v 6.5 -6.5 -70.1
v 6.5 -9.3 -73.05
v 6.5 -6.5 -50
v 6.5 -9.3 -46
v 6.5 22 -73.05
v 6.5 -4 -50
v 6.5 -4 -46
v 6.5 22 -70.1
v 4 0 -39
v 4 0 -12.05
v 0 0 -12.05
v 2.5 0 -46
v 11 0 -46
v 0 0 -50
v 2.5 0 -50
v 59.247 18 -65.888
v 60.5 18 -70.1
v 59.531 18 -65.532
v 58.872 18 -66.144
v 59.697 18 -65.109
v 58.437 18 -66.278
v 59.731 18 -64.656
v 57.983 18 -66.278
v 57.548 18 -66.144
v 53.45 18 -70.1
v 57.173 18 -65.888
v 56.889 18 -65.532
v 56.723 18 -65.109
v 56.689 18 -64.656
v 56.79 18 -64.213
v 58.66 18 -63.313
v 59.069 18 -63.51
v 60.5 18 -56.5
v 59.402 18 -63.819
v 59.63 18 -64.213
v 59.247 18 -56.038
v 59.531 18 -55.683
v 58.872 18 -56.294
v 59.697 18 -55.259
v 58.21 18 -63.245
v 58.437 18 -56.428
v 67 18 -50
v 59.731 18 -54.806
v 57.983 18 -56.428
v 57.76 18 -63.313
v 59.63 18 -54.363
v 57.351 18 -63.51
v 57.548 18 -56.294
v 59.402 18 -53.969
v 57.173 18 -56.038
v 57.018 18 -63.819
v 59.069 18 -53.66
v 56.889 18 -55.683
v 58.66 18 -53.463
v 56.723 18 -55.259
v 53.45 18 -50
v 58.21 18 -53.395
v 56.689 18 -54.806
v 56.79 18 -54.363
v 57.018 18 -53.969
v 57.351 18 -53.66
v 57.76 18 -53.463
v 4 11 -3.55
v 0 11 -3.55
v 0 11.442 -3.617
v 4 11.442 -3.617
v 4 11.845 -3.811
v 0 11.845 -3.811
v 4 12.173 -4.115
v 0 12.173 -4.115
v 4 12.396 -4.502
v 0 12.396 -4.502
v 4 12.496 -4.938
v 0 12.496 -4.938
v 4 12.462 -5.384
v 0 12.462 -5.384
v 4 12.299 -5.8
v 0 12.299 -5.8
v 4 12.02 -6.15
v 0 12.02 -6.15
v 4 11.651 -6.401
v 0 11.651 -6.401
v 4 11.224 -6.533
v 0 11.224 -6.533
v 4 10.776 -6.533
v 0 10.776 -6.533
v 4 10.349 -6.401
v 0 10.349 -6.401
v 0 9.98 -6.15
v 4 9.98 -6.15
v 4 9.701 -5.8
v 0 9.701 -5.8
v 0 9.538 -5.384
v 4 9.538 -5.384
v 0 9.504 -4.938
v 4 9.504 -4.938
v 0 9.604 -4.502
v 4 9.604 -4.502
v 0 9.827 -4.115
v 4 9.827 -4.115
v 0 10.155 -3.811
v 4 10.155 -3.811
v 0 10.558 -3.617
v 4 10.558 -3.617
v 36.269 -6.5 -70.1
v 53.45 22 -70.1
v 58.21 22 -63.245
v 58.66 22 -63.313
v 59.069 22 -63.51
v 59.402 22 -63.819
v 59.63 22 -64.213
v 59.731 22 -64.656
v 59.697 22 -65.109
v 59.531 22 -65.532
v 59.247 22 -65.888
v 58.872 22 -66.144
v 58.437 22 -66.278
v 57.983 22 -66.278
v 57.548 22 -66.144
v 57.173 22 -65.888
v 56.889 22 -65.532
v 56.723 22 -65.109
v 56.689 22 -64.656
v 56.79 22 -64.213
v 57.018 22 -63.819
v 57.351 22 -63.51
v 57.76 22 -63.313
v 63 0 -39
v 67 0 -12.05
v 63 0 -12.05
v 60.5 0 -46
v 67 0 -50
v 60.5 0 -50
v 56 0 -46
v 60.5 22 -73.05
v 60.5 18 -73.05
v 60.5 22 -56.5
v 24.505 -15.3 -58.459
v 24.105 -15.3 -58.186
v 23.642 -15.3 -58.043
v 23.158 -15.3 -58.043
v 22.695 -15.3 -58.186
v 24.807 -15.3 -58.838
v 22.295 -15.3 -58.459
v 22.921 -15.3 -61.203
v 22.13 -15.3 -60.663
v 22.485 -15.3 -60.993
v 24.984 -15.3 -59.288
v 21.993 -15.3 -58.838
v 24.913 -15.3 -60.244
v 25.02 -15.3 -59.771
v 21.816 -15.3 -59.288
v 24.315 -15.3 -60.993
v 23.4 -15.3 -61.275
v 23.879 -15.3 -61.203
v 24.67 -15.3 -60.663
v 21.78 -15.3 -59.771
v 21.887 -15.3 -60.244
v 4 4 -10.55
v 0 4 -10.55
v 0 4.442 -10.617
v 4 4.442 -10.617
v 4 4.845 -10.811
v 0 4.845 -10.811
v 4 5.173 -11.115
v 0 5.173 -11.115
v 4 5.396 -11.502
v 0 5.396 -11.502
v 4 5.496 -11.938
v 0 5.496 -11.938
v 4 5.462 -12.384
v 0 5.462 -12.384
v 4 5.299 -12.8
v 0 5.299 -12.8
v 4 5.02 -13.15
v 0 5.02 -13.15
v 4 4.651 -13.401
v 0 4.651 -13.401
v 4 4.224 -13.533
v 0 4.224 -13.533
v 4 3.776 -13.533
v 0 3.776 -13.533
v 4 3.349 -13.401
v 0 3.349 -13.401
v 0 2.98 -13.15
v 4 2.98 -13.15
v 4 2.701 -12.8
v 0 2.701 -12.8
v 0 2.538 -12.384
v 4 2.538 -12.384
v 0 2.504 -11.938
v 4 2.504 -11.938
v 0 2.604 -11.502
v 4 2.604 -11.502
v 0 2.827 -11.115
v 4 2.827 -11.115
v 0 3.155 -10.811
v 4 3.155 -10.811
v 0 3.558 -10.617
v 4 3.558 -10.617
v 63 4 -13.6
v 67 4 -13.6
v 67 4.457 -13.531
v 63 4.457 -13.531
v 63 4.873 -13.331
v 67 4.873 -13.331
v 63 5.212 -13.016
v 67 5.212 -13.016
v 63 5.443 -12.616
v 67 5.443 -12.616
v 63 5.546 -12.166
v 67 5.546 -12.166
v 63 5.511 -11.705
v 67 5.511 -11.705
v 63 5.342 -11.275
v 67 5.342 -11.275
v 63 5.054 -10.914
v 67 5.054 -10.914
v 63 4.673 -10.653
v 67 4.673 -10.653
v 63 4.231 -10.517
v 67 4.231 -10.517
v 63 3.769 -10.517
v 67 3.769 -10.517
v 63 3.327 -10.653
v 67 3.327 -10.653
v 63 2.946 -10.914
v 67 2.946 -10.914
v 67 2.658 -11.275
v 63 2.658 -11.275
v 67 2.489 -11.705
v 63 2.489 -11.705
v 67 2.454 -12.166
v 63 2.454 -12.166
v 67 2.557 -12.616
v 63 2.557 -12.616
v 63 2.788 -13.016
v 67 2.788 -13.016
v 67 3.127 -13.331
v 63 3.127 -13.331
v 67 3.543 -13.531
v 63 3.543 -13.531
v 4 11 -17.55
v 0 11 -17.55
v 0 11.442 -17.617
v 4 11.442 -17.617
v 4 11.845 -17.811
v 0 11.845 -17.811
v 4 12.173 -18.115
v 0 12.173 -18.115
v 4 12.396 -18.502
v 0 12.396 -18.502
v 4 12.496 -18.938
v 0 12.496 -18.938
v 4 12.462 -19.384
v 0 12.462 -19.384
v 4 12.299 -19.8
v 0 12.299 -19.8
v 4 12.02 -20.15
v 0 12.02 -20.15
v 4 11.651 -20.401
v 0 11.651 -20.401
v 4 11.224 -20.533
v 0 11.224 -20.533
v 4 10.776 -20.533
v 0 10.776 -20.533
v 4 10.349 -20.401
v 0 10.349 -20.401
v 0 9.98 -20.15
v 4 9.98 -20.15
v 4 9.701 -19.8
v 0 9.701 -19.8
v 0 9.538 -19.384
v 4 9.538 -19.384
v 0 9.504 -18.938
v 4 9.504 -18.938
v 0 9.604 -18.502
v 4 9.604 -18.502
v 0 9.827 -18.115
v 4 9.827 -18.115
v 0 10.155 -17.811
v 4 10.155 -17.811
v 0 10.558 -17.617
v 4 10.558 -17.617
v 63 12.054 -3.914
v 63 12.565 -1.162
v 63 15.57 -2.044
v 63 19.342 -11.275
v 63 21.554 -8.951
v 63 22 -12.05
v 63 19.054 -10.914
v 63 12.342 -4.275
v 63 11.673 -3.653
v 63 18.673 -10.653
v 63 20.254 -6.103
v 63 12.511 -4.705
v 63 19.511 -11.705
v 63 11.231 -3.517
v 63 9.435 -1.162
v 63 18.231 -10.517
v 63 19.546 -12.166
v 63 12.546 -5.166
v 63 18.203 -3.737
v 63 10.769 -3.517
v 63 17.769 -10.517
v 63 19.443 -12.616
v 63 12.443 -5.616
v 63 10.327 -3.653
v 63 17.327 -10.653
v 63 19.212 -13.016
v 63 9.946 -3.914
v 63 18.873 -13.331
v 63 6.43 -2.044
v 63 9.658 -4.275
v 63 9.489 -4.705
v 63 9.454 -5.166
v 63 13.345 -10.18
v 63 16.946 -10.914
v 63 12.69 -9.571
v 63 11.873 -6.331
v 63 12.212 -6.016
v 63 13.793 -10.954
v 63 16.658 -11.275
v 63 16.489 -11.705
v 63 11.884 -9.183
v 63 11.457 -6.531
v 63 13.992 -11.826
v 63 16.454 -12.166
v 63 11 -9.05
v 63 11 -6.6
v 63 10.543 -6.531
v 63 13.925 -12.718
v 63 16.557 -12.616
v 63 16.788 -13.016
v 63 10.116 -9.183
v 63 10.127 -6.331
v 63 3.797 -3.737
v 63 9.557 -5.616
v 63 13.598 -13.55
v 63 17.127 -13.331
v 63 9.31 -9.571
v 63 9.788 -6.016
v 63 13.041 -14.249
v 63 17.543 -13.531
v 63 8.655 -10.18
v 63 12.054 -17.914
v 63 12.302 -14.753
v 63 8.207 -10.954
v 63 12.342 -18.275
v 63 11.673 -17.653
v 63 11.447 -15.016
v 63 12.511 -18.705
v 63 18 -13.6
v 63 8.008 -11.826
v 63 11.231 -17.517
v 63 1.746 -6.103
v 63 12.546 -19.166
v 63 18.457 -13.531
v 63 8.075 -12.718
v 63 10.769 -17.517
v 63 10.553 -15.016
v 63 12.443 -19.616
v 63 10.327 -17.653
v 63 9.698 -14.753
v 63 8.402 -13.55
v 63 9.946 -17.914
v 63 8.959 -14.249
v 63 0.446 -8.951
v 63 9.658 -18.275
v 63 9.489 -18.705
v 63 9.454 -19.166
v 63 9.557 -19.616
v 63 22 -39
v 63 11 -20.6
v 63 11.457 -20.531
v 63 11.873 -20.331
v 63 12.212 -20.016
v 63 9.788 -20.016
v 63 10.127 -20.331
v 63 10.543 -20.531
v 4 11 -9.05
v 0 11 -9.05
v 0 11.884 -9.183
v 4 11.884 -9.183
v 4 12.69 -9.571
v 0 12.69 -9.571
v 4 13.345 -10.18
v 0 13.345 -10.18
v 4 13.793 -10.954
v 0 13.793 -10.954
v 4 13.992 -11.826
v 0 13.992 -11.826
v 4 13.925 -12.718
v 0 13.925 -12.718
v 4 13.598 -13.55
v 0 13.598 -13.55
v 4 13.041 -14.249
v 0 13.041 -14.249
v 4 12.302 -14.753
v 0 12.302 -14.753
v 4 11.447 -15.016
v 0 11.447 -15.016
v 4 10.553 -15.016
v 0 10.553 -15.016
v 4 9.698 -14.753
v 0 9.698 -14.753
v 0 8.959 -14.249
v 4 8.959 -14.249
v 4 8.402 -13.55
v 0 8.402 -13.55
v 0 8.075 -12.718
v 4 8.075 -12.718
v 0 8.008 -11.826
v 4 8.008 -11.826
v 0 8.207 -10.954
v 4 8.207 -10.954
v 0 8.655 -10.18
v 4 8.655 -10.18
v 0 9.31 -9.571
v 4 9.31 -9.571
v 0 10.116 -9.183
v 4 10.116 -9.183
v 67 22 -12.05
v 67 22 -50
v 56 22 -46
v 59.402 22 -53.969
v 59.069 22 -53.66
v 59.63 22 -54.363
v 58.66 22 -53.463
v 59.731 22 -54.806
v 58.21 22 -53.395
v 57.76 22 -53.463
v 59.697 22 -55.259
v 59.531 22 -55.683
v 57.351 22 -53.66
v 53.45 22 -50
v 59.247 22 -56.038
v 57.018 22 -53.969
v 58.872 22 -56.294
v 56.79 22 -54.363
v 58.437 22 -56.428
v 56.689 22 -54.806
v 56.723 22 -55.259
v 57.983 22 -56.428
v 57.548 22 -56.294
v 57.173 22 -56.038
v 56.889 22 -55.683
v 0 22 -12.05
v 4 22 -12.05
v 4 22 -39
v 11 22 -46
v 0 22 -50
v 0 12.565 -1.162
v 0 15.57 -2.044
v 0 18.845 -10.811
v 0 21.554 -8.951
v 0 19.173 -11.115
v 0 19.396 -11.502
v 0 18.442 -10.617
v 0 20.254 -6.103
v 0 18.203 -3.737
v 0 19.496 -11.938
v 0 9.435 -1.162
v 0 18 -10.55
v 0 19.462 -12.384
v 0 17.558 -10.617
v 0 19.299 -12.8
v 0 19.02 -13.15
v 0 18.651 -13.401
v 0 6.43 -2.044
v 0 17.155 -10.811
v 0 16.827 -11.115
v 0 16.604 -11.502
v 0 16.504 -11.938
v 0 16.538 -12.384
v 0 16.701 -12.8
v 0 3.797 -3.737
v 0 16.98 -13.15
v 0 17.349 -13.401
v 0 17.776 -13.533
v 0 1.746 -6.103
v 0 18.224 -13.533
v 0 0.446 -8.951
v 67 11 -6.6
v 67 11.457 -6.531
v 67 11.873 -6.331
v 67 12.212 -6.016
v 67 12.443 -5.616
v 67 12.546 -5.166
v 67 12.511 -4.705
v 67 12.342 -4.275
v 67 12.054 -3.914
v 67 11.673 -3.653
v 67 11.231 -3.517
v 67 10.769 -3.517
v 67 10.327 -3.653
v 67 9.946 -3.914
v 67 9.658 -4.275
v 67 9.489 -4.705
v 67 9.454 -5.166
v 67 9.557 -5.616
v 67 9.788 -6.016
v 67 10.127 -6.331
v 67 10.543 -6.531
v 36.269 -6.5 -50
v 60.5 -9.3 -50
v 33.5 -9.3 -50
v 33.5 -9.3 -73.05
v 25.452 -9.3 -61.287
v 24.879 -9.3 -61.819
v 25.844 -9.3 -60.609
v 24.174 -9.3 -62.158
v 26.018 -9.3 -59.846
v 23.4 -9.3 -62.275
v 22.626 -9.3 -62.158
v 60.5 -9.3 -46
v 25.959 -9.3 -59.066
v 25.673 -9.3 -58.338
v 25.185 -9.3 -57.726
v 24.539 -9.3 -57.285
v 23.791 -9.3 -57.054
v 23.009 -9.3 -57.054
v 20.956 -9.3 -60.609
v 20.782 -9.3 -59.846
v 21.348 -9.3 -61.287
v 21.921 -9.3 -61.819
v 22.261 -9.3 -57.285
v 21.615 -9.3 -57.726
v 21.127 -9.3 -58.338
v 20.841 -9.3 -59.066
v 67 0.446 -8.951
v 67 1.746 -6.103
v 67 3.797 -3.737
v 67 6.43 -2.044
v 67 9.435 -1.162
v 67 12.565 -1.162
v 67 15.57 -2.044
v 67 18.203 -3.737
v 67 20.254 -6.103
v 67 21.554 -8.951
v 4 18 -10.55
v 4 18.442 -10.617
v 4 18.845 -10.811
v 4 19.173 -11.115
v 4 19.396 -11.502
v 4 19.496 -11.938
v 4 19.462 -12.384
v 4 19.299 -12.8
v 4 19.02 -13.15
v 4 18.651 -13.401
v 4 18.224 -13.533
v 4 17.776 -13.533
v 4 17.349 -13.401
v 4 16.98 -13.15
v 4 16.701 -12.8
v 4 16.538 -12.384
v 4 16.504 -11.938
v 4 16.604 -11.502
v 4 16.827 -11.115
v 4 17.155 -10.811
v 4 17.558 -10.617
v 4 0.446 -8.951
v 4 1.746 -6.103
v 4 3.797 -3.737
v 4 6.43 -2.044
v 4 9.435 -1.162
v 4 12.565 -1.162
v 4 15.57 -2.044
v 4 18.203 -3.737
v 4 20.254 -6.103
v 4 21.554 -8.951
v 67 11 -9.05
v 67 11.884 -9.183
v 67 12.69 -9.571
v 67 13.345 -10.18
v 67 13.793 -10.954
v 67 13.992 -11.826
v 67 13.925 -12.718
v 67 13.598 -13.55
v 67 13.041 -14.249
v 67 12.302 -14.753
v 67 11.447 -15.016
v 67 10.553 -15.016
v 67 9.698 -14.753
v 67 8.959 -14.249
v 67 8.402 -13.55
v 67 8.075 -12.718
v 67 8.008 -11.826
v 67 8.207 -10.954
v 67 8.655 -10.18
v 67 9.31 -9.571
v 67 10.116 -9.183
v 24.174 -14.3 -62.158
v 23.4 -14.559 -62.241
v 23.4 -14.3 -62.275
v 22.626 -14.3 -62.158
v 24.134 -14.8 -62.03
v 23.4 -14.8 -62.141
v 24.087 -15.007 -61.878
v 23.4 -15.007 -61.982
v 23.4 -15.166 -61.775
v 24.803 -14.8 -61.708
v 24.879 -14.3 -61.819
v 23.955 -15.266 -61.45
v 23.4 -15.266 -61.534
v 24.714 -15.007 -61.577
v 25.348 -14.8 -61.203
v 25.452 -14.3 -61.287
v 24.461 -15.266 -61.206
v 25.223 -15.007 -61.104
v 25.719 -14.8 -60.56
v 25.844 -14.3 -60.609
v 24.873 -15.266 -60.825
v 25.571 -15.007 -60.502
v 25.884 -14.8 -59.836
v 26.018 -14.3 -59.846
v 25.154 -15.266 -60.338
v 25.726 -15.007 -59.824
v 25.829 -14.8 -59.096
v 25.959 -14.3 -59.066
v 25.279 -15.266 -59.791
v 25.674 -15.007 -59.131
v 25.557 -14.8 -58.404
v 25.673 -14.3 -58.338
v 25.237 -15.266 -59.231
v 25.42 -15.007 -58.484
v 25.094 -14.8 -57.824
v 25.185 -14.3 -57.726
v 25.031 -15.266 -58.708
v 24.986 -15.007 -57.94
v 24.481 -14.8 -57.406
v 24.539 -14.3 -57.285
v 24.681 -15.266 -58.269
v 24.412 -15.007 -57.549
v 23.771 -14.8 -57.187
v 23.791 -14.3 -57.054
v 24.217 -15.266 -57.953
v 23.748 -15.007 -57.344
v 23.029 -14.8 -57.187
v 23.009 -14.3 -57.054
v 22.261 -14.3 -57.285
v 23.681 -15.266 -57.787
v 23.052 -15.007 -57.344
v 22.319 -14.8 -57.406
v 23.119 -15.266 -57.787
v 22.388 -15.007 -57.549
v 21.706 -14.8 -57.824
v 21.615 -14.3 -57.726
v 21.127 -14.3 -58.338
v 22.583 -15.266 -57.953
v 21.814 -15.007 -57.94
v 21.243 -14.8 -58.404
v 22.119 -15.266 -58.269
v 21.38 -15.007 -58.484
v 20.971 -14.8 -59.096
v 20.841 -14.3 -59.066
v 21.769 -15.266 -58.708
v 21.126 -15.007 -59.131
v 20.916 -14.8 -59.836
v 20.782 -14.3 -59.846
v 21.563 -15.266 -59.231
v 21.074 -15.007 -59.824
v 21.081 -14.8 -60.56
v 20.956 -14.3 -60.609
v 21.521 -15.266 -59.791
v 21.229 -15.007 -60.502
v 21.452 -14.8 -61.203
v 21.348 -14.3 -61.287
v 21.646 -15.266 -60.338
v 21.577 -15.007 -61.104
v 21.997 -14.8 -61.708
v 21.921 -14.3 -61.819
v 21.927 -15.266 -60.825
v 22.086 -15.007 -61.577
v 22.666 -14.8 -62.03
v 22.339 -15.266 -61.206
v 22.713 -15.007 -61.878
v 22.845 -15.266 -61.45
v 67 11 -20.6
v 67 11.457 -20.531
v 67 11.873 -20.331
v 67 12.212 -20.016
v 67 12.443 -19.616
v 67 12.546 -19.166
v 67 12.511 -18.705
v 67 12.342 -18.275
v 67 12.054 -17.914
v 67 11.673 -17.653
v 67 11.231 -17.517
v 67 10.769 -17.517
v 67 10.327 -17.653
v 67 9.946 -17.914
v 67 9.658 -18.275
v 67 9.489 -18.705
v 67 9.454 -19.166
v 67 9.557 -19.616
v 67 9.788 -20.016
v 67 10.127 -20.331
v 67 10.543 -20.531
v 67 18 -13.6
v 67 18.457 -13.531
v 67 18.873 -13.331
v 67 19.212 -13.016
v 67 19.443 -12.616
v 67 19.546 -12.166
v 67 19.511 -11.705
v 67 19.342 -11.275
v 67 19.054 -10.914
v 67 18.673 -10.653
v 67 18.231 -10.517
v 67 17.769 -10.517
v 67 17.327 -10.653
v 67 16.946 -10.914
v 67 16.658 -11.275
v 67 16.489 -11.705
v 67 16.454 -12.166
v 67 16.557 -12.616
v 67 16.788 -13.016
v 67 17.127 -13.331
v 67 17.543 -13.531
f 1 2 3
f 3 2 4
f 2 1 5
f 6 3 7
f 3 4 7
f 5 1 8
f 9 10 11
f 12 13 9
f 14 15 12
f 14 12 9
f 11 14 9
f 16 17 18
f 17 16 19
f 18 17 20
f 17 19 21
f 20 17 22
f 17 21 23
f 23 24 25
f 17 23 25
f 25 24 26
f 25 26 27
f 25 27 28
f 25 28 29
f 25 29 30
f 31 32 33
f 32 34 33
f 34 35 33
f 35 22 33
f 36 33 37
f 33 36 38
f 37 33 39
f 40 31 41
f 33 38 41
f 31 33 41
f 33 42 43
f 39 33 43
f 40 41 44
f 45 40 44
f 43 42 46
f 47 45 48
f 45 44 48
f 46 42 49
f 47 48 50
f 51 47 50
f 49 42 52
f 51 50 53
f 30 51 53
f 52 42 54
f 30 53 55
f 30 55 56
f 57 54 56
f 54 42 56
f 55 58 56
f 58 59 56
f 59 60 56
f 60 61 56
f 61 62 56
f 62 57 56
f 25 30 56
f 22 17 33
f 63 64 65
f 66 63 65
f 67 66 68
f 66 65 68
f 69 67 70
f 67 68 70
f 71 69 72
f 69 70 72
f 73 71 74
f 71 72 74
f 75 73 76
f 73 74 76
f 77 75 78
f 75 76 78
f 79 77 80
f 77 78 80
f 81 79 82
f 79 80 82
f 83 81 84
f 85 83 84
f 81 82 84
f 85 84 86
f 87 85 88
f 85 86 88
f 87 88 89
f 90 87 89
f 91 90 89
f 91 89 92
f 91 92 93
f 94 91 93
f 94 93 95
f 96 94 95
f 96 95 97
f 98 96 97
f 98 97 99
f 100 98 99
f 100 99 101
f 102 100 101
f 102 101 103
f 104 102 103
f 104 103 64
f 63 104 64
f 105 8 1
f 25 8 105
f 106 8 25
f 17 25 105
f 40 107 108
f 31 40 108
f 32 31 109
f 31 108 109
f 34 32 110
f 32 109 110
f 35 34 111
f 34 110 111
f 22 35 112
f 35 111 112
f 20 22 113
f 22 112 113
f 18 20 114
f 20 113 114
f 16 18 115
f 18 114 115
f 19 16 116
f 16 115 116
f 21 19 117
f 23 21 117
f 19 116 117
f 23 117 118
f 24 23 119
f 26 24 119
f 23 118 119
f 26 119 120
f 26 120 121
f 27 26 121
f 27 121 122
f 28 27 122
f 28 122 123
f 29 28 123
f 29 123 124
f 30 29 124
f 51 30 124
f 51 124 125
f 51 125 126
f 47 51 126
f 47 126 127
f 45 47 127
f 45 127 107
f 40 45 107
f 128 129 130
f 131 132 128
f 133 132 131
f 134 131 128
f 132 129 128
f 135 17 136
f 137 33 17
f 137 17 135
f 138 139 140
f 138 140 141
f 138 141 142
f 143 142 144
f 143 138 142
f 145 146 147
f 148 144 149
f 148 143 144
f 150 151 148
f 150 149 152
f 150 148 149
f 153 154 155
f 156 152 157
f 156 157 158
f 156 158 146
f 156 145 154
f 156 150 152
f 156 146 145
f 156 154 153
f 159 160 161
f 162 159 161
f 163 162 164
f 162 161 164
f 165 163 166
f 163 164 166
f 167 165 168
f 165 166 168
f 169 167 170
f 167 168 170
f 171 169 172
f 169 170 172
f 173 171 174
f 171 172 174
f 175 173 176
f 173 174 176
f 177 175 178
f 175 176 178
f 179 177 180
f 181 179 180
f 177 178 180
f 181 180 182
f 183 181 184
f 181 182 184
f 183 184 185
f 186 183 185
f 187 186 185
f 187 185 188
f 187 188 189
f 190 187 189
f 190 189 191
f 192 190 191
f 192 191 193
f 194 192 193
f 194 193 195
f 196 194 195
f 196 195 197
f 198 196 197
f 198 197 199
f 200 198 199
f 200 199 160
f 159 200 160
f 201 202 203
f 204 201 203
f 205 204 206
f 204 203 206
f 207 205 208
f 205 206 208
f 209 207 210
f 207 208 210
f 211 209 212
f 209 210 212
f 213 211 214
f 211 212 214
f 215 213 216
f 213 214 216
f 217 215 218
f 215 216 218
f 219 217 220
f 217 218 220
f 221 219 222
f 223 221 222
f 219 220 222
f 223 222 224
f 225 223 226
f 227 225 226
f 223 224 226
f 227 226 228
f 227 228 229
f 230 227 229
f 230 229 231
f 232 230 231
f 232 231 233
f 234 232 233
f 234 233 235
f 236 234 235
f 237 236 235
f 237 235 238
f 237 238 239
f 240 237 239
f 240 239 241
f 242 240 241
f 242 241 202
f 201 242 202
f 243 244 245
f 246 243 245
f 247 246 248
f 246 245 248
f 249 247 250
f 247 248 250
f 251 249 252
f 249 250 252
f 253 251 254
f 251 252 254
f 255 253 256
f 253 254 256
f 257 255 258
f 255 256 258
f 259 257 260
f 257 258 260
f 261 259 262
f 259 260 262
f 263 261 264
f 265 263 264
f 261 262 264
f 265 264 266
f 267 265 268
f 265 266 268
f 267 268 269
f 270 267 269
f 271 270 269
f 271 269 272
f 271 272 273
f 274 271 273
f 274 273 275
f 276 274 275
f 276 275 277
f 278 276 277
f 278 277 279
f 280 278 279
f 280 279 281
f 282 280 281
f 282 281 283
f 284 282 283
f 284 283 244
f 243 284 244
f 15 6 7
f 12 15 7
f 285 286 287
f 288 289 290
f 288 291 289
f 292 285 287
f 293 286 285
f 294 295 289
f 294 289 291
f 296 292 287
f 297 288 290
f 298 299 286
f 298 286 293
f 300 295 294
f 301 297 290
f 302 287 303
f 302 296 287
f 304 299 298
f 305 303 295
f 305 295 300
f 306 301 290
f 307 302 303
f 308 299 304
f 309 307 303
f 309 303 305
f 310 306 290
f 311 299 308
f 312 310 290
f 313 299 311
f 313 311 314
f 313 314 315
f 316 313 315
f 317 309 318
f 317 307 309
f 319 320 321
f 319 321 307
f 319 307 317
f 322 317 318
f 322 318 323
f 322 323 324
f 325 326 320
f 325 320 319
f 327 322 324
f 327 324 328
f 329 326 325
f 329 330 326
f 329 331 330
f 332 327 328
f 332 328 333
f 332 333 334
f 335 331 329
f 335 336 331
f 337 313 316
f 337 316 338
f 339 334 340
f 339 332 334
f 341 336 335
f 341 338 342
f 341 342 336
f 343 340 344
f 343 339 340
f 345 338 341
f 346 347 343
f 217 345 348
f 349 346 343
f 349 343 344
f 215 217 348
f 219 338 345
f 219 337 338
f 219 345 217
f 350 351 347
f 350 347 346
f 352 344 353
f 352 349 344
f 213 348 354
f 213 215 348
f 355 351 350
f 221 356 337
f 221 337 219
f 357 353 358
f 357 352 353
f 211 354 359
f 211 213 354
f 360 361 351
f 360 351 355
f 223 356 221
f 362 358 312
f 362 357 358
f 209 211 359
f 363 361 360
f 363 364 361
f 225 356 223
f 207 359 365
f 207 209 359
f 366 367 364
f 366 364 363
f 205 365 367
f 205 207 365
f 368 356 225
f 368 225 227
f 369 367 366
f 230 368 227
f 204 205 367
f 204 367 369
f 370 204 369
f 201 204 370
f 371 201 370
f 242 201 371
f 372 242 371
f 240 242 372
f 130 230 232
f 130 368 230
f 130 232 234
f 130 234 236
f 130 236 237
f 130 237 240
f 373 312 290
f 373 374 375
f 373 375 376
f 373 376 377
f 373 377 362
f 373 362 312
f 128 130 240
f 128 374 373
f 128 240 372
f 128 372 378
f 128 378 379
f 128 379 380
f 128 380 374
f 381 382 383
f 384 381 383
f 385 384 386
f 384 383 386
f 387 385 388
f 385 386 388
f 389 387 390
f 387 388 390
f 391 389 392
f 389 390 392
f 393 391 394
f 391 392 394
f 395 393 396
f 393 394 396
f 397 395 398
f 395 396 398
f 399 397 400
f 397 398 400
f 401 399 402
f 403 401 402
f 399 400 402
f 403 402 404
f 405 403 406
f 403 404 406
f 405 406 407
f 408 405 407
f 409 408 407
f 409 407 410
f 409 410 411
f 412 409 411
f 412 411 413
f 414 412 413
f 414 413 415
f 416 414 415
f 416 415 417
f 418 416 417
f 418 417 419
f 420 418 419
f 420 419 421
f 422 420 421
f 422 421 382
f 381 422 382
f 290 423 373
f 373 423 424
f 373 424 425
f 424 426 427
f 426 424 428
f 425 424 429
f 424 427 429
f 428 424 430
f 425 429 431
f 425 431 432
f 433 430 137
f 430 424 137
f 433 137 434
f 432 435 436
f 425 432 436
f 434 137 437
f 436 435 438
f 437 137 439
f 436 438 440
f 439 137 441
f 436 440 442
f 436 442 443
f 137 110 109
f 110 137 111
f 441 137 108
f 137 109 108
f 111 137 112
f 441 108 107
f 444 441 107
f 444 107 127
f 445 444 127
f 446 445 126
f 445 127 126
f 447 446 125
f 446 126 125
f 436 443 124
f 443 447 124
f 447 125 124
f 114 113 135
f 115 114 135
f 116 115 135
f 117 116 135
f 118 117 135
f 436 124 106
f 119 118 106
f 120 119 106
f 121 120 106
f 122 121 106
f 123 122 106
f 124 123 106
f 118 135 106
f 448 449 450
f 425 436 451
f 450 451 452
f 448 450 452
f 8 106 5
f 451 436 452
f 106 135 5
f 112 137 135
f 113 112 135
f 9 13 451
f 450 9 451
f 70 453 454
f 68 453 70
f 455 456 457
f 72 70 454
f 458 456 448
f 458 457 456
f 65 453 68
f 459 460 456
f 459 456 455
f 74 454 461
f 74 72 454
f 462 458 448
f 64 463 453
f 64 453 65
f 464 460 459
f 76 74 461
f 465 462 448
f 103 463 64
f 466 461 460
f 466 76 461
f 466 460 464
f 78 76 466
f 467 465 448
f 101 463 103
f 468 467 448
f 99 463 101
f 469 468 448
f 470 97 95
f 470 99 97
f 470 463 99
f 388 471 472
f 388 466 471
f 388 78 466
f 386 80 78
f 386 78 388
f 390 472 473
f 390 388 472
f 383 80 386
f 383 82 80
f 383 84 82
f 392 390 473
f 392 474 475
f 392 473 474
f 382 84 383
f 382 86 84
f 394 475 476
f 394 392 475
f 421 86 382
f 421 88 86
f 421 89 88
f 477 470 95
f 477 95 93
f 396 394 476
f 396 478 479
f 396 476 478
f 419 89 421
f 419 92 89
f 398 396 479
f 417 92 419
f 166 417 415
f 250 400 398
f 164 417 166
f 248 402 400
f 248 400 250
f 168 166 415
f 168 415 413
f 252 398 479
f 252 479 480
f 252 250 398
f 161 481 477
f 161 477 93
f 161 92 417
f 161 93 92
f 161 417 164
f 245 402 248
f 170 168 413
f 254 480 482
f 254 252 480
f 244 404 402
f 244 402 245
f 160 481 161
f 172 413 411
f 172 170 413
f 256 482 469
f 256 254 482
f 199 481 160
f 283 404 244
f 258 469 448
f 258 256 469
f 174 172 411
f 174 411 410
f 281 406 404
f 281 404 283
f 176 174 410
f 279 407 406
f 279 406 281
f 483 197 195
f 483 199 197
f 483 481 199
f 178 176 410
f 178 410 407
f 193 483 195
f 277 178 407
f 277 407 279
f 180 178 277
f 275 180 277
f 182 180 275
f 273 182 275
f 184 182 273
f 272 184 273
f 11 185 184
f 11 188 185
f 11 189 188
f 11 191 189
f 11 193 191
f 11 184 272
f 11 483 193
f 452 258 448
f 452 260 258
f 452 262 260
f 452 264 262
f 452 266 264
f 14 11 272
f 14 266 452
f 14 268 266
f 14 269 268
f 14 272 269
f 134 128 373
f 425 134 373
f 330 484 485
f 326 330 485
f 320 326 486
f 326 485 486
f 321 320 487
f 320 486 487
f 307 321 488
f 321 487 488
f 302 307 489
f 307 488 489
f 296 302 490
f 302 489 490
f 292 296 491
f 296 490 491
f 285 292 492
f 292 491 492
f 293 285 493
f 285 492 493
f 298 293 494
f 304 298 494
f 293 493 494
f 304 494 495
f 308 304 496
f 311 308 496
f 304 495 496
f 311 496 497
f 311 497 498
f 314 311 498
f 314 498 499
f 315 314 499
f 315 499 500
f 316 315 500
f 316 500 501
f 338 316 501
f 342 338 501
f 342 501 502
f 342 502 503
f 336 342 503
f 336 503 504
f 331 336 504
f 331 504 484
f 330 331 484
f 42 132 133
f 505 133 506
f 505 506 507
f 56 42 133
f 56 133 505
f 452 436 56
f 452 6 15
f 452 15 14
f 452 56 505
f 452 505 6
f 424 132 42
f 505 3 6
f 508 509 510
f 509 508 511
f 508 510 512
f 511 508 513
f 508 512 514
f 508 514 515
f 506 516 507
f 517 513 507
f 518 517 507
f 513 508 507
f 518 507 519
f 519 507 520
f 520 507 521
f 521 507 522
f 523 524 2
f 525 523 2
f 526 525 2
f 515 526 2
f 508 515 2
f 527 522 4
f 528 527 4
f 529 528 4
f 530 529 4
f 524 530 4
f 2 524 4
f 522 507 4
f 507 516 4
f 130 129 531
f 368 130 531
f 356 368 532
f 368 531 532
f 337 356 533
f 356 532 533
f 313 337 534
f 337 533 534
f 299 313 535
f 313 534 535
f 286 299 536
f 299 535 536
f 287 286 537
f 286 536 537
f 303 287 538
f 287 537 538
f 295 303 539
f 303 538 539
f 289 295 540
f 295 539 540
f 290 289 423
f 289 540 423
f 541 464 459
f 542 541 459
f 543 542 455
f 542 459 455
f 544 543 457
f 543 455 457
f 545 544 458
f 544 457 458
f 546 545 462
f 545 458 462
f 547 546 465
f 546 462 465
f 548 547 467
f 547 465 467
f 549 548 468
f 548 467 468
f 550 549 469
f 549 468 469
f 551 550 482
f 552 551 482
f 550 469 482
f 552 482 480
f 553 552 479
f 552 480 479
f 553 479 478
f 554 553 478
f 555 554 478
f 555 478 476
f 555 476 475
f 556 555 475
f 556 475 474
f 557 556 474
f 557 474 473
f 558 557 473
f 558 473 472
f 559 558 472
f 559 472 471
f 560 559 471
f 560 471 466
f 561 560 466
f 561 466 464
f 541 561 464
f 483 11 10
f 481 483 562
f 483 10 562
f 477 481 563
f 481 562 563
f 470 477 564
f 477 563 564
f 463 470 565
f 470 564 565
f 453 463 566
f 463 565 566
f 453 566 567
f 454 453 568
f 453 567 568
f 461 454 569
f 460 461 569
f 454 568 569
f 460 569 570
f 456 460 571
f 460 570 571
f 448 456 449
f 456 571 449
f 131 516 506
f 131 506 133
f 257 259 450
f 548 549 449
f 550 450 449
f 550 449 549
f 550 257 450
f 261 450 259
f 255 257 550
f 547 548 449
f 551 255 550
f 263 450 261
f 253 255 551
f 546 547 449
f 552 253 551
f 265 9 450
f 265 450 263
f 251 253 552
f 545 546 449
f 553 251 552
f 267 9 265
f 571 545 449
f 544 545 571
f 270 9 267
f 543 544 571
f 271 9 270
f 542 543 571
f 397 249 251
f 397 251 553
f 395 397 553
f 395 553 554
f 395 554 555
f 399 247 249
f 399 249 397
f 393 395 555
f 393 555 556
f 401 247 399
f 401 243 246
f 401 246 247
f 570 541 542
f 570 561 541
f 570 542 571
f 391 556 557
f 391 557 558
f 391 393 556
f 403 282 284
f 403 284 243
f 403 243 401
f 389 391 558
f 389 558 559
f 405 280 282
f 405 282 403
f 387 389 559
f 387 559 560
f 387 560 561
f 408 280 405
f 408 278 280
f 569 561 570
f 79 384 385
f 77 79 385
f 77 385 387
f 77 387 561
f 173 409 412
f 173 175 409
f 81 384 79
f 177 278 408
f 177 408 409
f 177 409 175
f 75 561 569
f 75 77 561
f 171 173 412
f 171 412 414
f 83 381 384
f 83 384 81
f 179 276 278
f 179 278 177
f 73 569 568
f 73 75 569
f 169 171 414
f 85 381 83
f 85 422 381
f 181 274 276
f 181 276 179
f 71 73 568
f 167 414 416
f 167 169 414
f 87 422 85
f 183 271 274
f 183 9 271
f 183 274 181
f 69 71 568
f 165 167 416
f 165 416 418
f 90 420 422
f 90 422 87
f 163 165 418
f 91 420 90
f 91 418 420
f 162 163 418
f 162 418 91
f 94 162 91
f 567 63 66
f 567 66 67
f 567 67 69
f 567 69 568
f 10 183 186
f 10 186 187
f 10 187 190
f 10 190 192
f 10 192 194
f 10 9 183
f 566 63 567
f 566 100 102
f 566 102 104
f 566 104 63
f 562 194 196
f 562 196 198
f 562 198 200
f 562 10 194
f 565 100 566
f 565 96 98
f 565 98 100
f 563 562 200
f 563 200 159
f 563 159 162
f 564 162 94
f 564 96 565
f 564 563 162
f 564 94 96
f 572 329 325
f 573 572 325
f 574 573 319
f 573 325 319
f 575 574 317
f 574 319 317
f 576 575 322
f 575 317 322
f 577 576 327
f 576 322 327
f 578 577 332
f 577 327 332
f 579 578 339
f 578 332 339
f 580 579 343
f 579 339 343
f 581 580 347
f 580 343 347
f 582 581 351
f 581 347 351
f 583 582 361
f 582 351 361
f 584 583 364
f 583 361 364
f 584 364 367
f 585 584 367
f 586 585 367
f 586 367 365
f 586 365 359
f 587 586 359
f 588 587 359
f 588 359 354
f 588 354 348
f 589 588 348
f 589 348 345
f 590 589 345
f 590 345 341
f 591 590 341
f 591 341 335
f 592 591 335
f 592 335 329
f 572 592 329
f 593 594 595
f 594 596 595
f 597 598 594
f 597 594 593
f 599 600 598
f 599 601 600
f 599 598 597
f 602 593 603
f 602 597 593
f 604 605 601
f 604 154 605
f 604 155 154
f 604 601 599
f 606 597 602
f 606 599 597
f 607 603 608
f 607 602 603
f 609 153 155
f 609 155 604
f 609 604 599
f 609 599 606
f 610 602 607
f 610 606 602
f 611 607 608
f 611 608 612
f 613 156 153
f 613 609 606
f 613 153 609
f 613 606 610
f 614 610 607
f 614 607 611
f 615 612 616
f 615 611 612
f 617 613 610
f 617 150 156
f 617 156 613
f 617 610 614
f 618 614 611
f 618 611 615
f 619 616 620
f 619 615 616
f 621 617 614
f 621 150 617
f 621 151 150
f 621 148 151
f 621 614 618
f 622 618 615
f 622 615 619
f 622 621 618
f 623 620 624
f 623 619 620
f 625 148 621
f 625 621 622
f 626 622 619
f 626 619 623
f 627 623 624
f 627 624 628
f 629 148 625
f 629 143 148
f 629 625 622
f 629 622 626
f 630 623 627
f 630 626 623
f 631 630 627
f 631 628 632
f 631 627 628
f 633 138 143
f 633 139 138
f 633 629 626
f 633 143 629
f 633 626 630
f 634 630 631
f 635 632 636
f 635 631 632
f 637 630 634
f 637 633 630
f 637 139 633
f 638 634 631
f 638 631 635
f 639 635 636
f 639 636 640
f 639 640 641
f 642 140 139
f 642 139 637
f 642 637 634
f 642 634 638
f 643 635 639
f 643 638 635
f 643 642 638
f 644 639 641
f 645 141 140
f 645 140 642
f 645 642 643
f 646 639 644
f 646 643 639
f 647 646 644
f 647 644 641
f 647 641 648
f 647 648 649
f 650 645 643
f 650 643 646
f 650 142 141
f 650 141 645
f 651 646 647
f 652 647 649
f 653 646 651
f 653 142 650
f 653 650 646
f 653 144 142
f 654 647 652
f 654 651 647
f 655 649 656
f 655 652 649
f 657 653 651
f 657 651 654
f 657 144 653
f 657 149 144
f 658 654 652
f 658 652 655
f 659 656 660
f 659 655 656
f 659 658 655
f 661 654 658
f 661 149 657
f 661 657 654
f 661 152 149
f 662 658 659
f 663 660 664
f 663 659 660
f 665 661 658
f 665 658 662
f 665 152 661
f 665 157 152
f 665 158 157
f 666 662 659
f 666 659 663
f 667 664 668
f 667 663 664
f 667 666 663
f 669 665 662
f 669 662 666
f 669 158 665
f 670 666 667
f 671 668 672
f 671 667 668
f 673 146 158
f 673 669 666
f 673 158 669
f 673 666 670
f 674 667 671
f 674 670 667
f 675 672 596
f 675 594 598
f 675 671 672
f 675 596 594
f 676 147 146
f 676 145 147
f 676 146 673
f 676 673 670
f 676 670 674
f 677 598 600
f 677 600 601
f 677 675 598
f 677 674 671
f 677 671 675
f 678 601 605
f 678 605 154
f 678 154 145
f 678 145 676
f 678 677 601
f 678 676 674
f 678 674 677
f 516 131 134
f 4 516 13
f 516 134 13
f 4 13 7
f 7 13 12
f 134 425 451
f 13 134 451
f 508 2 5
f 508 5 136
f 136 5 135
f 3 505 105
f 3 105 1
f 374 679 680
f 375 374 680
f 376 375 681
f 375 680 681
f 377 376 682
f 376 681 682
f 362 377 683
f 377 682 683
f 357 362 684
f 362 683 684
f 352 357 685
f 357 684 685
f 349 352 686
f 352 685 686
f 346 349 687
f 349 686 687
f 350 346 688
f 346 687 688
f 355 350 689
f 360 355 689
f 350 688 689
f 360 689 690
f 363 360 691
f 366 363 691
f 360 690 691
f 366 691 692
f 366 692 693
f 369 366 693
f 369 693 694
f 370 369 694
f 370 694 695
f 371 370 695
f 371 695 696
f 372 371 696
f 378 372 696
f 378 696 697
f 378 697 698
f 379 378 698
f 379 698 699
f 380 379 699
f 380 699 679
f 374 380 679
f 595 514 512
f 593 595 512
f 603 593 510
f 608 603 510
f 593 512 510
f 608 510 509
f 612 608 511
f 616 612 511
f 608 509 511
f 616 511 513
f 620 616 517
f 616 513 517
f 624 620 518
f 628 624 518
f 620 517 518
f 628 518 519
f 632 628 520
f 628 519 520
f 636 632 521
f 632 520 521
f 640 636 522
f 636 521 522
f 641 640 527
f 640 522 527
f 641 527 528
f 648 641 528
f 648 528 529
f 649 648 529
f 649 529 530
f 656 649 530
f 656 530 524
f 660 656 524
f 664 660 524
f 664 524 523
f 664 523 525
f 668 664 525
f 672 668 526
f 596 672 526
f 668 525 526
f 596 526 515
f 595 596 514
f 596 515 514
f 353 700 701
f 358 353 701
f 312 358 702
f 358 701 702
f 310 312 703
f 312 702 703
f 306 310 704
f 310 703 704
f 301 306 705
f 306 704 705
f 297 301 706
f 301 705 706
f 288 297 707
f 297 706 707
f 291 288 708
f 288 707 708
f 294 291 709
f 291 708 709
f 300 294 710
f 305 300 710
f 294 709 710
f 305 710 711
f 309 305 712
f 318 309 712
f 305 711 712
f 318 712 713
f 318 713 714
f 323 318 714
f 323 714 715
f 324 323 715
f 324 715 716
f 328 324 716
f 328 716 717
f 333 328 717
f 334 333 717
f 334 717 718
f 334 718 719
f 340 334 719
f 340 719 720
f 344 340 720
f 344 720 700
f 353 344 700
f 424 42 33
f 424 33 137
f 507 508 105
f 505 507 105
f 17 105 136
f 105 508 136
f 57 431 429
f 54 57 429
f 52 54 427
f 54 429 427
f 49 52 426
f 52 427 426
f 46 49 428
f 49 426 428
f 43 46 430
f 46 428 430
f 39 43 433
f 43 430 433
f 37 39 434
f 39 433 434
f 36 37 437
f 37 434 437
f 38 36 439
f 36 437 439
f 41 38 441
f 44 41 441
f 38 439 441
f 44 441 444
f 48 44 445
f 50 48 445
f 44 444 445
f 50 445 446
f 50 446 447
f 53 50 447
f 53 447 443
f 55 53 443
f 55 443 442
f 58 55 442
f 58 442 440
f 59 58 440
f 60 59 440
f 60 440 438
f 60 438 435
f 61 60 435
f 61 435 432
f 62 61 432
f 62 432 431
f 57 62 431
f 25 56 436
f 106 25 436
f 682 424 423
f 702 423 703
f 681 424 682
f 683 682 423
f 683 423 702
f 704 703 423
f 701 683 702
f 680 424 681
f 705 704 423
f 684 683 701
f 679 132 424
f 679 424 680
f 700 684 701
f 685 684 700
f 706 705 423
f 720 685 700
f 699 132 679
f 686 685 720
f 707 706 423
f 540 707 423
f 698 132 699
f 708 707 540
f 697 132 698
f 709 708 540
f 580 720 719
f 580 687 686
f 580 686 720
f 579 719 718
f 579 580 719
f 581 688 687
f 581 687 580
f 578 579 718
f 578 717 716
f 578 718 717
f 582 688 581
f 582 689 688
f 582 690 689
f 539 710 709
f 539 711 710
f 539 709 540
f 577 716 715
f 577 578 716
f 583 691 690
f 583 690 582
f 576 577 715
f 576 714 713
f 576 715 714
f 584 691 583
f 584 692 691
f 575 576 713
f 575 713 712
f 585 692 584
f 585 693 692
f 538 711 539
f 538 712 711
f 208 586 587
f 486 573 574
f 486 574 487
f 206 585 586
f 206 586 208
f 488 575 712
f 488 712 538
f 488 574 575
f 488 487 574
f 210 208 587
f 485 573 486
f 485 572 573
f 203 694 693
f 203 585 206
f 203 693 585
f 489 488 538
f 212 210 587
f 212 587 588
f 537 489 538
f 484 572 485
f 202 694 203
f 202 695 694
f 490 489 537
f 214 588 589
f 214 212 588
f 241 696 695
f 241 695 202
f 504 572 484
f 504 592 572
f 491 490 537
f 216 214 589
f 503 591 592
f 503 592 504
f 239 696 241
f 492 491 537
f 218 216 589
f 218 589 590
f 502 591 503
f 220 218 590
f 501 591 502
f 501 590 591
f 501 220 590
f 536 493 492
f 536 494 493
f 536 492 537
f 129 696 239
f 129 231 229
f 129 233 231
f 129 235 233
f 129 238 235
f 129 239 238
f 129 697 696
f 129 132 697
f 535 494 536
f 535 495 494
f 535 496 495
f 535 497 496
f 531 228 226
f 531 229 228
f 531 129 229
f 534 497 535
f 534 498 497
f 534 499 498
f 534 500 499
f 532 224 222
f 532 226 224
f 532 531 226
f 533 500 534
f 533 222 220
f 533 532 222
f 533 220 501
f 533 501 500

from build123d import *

# Parameters (mm, degrees)
BOSS_EXTRUDE1_DEPTH      = 22
SKETCH3_R                = 1.55
CUT_EXTRUDE1_DEPTH       = 30
CUT_EXTRUDE5_DEPTH       = 9
SKETCH11_R               = 1.55
CUT_EXTRUDE10_DEPTH      = 13
CUT_EXTRUDE11_START      = -10
CUT_EXTRUDE11_DEPTH      = 10
SKETCH13_R               = 3
SKETCH13_R_2             = 1.5
CUT_EXTRUDE12_DEPTH      = 72
FILLET1_SIZE             = 7
SKETCH14_W               = 54
SKETCH14_H               = 9.3
SKETCH14_W_2             = 7.05
SKETCH14_H_2             = 4
BOSS_EXTRUDE4_DEPTH      = 4
SKETCH17_W               = 7.05
SKETCH17_H               = 4
BOSS_EXTRUDE5_DEPTH      = 23.05
BOSS_EXTRUDE6_DEPTH      = 27.3
BOSS_EXTRUDE6_DEPTH_BACK = 4
SKETCH18_W               = 54
SKETCH18_H               = 2.95
SKETCH19_W               = 54
SKETCH19_H               = 2.8
BOSS_EXTRUDE7_DEPTH      = 21
FILLET2_SIZE             = 6.5
SKETCH20_R               = 2.625
BOSS_EXTRUDE8_DEPTH      = 6
FILLET4_R                = 1
CUT_EXTRUDE15_DEPTH      = 23.05
SKETCH23_W               = 18.360798368
SKETCH23_H               = 20.1
CUT_EXTRUDE16_DEPTH      = 23
FILLET7_SIZE             = 4
SKETCH26_R               = 1.525
CUT_EXTRUDE18_DEPTH      = 11.5


with BuildPart() as part:
    # Sketch1 → Boss-Extrude1 (new body)
    with BuildSketch(Plane(origin=(0, 0, 0), x_dir=(1, 0, 0), z_dir=(0, 1, 0))):
        Polygon((0, 0), (0, 50), (67, 50), (67, 0), (63, 0), (63, 46), (4, 46), (4, 0), align=None)
    extrude(amount=BOSS_EXTRUDE1_DEPTH)

    # Sketch3 → Cut-Extrude1 (cut)
    with BuildSketch(Plane(origin=(67, 0, 0), x_dir=(0, 0, -1), z_dir=(1, 0, 0))):
        with Locations((12.05, 11)):
            Circle(SKETCH3_R)
    extrude(amount=-CUT_EXTRUDE1_DEPTH, mode=Mode.SUBTRACT)

    # Sketch5 → Cut-Extrude5 (cut)
    with BuildSketch(Plane(origin=(67, 0, 0), x_dir=(0, 0, -1), z_dir=(1, 0, 0))):
        with BuildLine():
            Line((12.05, 22), (0, 22))
            Line((0, 22), (0, 0))
            Line((0, 0), (12.05, 0))
            ThreePointArc((12.05, 0), (1.05, 11), (12.05, 22))
        make_face()
    extrude(amount=-CUT_EXTRUDE5_DEPTH, mode=Mode.SUBTRACT)

    # Sketch11 → Cut-Extrude10 (cut)
    with BuildSketch(Plane(origin=(67, 0, 0), x_dir=(0, 0, -1), z_dir=(1, 0, 0))):
        with Locations((19.05, 11)):
            Circle(SKETCH11_R)
        with Locations((12.05, 18)):
            Circle(SKETCH11_R)
        with Locations((12.05, 4)):
            Circle(SKETCH11_R)
        with Locations((5.05, 11)):
            Circle(SKETCH11_R)
    extrude(amount=-CUT_EXTRUDE10_DEPTH, mode=Mode.SUBTRACT)

    # Sketch12 → Cut-Extrude11 (cut)
    with BuildSketch(Plane.ZY.offset(CUT_EXTRUDE11_START)):
        with BuildLine():
            Line((-12.05, 22), (0, 22))
            Line((0, 22), (0, 0))
            Line((0, 0), (-12.05, 0))
            ThreePointArc((-12.05, 0), (-1.05, 11), (-12.05, 22))
        make_face()
    extrude(amount=CUT_EXTRUDE11_DEPTH, mode=Mode.SUBTRACT)

    # Sketch13 → Cut-Extrude12 (cut)
    with BuildSketch(Plane.ZY):
        with Locations((-12.05, 11)):
            Circle(SKETCH13_R)
        with Locations((-19.05, 11)):
            Circle(SKETCH13_R_2)
        with Locations((-12.05, 4)):
            Circle(SKETCH13_R_2)
        with Locations((-5.05, 11)):
            Circle(SKETCH13_R_2)
        with Locations((-12.05, 18)):
            Circle(SKETCH13_R_2)
    extrude(amount=-CUT_EXTRUDE12_DEPTH, mode=Mode.SUBTRACT)

    # Fillet1
    fillet1_edges = [part.edges().sort_by_distance(p)[0] for p in [
        (63, 11, -46),
        (4, 11, -46),
    ]]
    chamfer(fillet1_edges, length=FILLET1_SIZE)

    # Sketch14 → Boss-Extrude4 (add)
    with BuildSketch(Plane(origin=(0, 0, -50), x_dir=(-1, 0, 0), z_dir=(0, 0, -1))):
        with Locations((-33.5, -4.65)):
            Rectangle(SKETCH14_W, SKETCH14_H)
        with Locations((-56.975, 20)):
            Rectangle(SKETCH14_W_2, SKETCH14_H_2)
        with Locations((-10.025, 20)):
            Rectangle(SKETCH14_W_2, SKETCH14_H_2)
    extrude(amount=-BOSS_EXTRUDE4_DEPTH)

    # Sketch17 → Boss-Extrude5 (add)
    with BuildSketch(Plane(origin=(0, 0, -50), x_dir=(-1, 0, 0), z_dir=(0, 0, -1))):
        with Locations((-56.975, 20)):
            Rectangle(SKETCH17_W, SKETCH17_H)
        with Locations((-10.025, 20)):
            Rectangle(SKETCH17_W, SKETCH17_H)
    extrude(amount=BOSS_EXTRUDE5_DEPTH)

    # Sketch18 → Boss-Extrude6 (add, two sides: drawn at the far end of the back side and taken through both)
    with BuildSketch(Plane.XZ.offset(-18).offset(-BOSS_EXTRUDE6_DEPTH_BACK)):
        with Locations((33.5, -71.575)):
            Rectangle(SKETCH18_W, SKETCH18_H)
    extrude(amount=BOSS_EXTRUDE6_DEPTH + BOSS_EXTRUDE6_DEPTH_BACK)

    # Sketch19 → Boss-Extrude7 (add)
    with BuildSketch(Plane(origin=(0, 0, -50), x_dir=(-1, 0, 0), z_dir=(0, 0, -1))):
        with Locations((-33.5, -7.9)):
            Rectangle(SKETCH19_W, SKETCH19_H)
    extrude(amount=BOSS_EXTRUDE7_DEPTH)

    # Fillet2
    fillet2_edges = [part.edges().sort_by_distance(p)[0] for p in [
        (60.5, 20, -50),
        (6.5, 20, -50),
    ]]
    chamfer(fillet2_edges, length=FILLET2_SIZE - 0.0001)  # a hair under: the kernel refuses the full size

    # Sketch20 → Boss-Extrude8 (add)
    with BuildSketch(Plane.XZ.offset(9.3)):
        with Locations(Location((23.4, -59.65, 0), (0, 0, 270))):
            Circle(SKETCH20_R)
    extrude(amount=BOSS_EXTRUDE8_DEPTH)

    # Fillet4
    fillet4_edges = [part.edges().sort_by_distance(p)[0] for p in [
        (23.4, -15.3, -57.025),
    ]]
    fillet(fillet4_edges, radius=FILLET4_R)

    # Sketch22 → Cut-Extrude15 (cut)
    with BuildSketch(Plane(origin=(0, 0, -73.05), x_dir=(-1, 0, 0), z_dir=(0, 0, -1))):
        Polygon((-60.5, -9.3), (-33.5, -9.3), (-60.5, 18), align=None)
    extrude(amount=-CUT_EXTRUDE15_DEPTH, mode=Mode.SUBTRACT)

    # Sketch23 → Cut-Extrude16 (cut)
    with BuildSketch(Plane(origin=(0, 22, 0), x_dir=(1, 0, 0), z_dir=(0, 1, 0))):
        with Locations((4.369600816, 60.05)):
            Rectangle(SKETCH23_W, SKETCH23_H)
    extrude(amount=-CUT_EXTRUDE16_DEPTH, mode=Mode.SUBTRACT)

    # Fillet7
    fillet7_edges = [part.edges().sort_by_distance(p)[0] for p in [
        (6.5, 0, -48),
    ]]
    chamfer(fillet7_edges, length=FILLET7_SIZE)

    # Sketch26 → Cut-Extrude18 (cut)
    with BuildSketch(Plane(origin=(0, 22, 0), x_dir=(1, 0, 0), z_dir=(0, 1, 0))):
        with Locations(Location((58.21, 64.77, 0), (0, 0, 270))):
            Circle(SKETCH26_R)
        with Locations(Location((58.21, 54.92, 0), (0, 0, 270))):
            Circle(SKETCH26_R)
    extrude(amount=-CUT_EXTRUDE18_DEPTH, mode=Mode.SUBTRACT)


solid = part.part
